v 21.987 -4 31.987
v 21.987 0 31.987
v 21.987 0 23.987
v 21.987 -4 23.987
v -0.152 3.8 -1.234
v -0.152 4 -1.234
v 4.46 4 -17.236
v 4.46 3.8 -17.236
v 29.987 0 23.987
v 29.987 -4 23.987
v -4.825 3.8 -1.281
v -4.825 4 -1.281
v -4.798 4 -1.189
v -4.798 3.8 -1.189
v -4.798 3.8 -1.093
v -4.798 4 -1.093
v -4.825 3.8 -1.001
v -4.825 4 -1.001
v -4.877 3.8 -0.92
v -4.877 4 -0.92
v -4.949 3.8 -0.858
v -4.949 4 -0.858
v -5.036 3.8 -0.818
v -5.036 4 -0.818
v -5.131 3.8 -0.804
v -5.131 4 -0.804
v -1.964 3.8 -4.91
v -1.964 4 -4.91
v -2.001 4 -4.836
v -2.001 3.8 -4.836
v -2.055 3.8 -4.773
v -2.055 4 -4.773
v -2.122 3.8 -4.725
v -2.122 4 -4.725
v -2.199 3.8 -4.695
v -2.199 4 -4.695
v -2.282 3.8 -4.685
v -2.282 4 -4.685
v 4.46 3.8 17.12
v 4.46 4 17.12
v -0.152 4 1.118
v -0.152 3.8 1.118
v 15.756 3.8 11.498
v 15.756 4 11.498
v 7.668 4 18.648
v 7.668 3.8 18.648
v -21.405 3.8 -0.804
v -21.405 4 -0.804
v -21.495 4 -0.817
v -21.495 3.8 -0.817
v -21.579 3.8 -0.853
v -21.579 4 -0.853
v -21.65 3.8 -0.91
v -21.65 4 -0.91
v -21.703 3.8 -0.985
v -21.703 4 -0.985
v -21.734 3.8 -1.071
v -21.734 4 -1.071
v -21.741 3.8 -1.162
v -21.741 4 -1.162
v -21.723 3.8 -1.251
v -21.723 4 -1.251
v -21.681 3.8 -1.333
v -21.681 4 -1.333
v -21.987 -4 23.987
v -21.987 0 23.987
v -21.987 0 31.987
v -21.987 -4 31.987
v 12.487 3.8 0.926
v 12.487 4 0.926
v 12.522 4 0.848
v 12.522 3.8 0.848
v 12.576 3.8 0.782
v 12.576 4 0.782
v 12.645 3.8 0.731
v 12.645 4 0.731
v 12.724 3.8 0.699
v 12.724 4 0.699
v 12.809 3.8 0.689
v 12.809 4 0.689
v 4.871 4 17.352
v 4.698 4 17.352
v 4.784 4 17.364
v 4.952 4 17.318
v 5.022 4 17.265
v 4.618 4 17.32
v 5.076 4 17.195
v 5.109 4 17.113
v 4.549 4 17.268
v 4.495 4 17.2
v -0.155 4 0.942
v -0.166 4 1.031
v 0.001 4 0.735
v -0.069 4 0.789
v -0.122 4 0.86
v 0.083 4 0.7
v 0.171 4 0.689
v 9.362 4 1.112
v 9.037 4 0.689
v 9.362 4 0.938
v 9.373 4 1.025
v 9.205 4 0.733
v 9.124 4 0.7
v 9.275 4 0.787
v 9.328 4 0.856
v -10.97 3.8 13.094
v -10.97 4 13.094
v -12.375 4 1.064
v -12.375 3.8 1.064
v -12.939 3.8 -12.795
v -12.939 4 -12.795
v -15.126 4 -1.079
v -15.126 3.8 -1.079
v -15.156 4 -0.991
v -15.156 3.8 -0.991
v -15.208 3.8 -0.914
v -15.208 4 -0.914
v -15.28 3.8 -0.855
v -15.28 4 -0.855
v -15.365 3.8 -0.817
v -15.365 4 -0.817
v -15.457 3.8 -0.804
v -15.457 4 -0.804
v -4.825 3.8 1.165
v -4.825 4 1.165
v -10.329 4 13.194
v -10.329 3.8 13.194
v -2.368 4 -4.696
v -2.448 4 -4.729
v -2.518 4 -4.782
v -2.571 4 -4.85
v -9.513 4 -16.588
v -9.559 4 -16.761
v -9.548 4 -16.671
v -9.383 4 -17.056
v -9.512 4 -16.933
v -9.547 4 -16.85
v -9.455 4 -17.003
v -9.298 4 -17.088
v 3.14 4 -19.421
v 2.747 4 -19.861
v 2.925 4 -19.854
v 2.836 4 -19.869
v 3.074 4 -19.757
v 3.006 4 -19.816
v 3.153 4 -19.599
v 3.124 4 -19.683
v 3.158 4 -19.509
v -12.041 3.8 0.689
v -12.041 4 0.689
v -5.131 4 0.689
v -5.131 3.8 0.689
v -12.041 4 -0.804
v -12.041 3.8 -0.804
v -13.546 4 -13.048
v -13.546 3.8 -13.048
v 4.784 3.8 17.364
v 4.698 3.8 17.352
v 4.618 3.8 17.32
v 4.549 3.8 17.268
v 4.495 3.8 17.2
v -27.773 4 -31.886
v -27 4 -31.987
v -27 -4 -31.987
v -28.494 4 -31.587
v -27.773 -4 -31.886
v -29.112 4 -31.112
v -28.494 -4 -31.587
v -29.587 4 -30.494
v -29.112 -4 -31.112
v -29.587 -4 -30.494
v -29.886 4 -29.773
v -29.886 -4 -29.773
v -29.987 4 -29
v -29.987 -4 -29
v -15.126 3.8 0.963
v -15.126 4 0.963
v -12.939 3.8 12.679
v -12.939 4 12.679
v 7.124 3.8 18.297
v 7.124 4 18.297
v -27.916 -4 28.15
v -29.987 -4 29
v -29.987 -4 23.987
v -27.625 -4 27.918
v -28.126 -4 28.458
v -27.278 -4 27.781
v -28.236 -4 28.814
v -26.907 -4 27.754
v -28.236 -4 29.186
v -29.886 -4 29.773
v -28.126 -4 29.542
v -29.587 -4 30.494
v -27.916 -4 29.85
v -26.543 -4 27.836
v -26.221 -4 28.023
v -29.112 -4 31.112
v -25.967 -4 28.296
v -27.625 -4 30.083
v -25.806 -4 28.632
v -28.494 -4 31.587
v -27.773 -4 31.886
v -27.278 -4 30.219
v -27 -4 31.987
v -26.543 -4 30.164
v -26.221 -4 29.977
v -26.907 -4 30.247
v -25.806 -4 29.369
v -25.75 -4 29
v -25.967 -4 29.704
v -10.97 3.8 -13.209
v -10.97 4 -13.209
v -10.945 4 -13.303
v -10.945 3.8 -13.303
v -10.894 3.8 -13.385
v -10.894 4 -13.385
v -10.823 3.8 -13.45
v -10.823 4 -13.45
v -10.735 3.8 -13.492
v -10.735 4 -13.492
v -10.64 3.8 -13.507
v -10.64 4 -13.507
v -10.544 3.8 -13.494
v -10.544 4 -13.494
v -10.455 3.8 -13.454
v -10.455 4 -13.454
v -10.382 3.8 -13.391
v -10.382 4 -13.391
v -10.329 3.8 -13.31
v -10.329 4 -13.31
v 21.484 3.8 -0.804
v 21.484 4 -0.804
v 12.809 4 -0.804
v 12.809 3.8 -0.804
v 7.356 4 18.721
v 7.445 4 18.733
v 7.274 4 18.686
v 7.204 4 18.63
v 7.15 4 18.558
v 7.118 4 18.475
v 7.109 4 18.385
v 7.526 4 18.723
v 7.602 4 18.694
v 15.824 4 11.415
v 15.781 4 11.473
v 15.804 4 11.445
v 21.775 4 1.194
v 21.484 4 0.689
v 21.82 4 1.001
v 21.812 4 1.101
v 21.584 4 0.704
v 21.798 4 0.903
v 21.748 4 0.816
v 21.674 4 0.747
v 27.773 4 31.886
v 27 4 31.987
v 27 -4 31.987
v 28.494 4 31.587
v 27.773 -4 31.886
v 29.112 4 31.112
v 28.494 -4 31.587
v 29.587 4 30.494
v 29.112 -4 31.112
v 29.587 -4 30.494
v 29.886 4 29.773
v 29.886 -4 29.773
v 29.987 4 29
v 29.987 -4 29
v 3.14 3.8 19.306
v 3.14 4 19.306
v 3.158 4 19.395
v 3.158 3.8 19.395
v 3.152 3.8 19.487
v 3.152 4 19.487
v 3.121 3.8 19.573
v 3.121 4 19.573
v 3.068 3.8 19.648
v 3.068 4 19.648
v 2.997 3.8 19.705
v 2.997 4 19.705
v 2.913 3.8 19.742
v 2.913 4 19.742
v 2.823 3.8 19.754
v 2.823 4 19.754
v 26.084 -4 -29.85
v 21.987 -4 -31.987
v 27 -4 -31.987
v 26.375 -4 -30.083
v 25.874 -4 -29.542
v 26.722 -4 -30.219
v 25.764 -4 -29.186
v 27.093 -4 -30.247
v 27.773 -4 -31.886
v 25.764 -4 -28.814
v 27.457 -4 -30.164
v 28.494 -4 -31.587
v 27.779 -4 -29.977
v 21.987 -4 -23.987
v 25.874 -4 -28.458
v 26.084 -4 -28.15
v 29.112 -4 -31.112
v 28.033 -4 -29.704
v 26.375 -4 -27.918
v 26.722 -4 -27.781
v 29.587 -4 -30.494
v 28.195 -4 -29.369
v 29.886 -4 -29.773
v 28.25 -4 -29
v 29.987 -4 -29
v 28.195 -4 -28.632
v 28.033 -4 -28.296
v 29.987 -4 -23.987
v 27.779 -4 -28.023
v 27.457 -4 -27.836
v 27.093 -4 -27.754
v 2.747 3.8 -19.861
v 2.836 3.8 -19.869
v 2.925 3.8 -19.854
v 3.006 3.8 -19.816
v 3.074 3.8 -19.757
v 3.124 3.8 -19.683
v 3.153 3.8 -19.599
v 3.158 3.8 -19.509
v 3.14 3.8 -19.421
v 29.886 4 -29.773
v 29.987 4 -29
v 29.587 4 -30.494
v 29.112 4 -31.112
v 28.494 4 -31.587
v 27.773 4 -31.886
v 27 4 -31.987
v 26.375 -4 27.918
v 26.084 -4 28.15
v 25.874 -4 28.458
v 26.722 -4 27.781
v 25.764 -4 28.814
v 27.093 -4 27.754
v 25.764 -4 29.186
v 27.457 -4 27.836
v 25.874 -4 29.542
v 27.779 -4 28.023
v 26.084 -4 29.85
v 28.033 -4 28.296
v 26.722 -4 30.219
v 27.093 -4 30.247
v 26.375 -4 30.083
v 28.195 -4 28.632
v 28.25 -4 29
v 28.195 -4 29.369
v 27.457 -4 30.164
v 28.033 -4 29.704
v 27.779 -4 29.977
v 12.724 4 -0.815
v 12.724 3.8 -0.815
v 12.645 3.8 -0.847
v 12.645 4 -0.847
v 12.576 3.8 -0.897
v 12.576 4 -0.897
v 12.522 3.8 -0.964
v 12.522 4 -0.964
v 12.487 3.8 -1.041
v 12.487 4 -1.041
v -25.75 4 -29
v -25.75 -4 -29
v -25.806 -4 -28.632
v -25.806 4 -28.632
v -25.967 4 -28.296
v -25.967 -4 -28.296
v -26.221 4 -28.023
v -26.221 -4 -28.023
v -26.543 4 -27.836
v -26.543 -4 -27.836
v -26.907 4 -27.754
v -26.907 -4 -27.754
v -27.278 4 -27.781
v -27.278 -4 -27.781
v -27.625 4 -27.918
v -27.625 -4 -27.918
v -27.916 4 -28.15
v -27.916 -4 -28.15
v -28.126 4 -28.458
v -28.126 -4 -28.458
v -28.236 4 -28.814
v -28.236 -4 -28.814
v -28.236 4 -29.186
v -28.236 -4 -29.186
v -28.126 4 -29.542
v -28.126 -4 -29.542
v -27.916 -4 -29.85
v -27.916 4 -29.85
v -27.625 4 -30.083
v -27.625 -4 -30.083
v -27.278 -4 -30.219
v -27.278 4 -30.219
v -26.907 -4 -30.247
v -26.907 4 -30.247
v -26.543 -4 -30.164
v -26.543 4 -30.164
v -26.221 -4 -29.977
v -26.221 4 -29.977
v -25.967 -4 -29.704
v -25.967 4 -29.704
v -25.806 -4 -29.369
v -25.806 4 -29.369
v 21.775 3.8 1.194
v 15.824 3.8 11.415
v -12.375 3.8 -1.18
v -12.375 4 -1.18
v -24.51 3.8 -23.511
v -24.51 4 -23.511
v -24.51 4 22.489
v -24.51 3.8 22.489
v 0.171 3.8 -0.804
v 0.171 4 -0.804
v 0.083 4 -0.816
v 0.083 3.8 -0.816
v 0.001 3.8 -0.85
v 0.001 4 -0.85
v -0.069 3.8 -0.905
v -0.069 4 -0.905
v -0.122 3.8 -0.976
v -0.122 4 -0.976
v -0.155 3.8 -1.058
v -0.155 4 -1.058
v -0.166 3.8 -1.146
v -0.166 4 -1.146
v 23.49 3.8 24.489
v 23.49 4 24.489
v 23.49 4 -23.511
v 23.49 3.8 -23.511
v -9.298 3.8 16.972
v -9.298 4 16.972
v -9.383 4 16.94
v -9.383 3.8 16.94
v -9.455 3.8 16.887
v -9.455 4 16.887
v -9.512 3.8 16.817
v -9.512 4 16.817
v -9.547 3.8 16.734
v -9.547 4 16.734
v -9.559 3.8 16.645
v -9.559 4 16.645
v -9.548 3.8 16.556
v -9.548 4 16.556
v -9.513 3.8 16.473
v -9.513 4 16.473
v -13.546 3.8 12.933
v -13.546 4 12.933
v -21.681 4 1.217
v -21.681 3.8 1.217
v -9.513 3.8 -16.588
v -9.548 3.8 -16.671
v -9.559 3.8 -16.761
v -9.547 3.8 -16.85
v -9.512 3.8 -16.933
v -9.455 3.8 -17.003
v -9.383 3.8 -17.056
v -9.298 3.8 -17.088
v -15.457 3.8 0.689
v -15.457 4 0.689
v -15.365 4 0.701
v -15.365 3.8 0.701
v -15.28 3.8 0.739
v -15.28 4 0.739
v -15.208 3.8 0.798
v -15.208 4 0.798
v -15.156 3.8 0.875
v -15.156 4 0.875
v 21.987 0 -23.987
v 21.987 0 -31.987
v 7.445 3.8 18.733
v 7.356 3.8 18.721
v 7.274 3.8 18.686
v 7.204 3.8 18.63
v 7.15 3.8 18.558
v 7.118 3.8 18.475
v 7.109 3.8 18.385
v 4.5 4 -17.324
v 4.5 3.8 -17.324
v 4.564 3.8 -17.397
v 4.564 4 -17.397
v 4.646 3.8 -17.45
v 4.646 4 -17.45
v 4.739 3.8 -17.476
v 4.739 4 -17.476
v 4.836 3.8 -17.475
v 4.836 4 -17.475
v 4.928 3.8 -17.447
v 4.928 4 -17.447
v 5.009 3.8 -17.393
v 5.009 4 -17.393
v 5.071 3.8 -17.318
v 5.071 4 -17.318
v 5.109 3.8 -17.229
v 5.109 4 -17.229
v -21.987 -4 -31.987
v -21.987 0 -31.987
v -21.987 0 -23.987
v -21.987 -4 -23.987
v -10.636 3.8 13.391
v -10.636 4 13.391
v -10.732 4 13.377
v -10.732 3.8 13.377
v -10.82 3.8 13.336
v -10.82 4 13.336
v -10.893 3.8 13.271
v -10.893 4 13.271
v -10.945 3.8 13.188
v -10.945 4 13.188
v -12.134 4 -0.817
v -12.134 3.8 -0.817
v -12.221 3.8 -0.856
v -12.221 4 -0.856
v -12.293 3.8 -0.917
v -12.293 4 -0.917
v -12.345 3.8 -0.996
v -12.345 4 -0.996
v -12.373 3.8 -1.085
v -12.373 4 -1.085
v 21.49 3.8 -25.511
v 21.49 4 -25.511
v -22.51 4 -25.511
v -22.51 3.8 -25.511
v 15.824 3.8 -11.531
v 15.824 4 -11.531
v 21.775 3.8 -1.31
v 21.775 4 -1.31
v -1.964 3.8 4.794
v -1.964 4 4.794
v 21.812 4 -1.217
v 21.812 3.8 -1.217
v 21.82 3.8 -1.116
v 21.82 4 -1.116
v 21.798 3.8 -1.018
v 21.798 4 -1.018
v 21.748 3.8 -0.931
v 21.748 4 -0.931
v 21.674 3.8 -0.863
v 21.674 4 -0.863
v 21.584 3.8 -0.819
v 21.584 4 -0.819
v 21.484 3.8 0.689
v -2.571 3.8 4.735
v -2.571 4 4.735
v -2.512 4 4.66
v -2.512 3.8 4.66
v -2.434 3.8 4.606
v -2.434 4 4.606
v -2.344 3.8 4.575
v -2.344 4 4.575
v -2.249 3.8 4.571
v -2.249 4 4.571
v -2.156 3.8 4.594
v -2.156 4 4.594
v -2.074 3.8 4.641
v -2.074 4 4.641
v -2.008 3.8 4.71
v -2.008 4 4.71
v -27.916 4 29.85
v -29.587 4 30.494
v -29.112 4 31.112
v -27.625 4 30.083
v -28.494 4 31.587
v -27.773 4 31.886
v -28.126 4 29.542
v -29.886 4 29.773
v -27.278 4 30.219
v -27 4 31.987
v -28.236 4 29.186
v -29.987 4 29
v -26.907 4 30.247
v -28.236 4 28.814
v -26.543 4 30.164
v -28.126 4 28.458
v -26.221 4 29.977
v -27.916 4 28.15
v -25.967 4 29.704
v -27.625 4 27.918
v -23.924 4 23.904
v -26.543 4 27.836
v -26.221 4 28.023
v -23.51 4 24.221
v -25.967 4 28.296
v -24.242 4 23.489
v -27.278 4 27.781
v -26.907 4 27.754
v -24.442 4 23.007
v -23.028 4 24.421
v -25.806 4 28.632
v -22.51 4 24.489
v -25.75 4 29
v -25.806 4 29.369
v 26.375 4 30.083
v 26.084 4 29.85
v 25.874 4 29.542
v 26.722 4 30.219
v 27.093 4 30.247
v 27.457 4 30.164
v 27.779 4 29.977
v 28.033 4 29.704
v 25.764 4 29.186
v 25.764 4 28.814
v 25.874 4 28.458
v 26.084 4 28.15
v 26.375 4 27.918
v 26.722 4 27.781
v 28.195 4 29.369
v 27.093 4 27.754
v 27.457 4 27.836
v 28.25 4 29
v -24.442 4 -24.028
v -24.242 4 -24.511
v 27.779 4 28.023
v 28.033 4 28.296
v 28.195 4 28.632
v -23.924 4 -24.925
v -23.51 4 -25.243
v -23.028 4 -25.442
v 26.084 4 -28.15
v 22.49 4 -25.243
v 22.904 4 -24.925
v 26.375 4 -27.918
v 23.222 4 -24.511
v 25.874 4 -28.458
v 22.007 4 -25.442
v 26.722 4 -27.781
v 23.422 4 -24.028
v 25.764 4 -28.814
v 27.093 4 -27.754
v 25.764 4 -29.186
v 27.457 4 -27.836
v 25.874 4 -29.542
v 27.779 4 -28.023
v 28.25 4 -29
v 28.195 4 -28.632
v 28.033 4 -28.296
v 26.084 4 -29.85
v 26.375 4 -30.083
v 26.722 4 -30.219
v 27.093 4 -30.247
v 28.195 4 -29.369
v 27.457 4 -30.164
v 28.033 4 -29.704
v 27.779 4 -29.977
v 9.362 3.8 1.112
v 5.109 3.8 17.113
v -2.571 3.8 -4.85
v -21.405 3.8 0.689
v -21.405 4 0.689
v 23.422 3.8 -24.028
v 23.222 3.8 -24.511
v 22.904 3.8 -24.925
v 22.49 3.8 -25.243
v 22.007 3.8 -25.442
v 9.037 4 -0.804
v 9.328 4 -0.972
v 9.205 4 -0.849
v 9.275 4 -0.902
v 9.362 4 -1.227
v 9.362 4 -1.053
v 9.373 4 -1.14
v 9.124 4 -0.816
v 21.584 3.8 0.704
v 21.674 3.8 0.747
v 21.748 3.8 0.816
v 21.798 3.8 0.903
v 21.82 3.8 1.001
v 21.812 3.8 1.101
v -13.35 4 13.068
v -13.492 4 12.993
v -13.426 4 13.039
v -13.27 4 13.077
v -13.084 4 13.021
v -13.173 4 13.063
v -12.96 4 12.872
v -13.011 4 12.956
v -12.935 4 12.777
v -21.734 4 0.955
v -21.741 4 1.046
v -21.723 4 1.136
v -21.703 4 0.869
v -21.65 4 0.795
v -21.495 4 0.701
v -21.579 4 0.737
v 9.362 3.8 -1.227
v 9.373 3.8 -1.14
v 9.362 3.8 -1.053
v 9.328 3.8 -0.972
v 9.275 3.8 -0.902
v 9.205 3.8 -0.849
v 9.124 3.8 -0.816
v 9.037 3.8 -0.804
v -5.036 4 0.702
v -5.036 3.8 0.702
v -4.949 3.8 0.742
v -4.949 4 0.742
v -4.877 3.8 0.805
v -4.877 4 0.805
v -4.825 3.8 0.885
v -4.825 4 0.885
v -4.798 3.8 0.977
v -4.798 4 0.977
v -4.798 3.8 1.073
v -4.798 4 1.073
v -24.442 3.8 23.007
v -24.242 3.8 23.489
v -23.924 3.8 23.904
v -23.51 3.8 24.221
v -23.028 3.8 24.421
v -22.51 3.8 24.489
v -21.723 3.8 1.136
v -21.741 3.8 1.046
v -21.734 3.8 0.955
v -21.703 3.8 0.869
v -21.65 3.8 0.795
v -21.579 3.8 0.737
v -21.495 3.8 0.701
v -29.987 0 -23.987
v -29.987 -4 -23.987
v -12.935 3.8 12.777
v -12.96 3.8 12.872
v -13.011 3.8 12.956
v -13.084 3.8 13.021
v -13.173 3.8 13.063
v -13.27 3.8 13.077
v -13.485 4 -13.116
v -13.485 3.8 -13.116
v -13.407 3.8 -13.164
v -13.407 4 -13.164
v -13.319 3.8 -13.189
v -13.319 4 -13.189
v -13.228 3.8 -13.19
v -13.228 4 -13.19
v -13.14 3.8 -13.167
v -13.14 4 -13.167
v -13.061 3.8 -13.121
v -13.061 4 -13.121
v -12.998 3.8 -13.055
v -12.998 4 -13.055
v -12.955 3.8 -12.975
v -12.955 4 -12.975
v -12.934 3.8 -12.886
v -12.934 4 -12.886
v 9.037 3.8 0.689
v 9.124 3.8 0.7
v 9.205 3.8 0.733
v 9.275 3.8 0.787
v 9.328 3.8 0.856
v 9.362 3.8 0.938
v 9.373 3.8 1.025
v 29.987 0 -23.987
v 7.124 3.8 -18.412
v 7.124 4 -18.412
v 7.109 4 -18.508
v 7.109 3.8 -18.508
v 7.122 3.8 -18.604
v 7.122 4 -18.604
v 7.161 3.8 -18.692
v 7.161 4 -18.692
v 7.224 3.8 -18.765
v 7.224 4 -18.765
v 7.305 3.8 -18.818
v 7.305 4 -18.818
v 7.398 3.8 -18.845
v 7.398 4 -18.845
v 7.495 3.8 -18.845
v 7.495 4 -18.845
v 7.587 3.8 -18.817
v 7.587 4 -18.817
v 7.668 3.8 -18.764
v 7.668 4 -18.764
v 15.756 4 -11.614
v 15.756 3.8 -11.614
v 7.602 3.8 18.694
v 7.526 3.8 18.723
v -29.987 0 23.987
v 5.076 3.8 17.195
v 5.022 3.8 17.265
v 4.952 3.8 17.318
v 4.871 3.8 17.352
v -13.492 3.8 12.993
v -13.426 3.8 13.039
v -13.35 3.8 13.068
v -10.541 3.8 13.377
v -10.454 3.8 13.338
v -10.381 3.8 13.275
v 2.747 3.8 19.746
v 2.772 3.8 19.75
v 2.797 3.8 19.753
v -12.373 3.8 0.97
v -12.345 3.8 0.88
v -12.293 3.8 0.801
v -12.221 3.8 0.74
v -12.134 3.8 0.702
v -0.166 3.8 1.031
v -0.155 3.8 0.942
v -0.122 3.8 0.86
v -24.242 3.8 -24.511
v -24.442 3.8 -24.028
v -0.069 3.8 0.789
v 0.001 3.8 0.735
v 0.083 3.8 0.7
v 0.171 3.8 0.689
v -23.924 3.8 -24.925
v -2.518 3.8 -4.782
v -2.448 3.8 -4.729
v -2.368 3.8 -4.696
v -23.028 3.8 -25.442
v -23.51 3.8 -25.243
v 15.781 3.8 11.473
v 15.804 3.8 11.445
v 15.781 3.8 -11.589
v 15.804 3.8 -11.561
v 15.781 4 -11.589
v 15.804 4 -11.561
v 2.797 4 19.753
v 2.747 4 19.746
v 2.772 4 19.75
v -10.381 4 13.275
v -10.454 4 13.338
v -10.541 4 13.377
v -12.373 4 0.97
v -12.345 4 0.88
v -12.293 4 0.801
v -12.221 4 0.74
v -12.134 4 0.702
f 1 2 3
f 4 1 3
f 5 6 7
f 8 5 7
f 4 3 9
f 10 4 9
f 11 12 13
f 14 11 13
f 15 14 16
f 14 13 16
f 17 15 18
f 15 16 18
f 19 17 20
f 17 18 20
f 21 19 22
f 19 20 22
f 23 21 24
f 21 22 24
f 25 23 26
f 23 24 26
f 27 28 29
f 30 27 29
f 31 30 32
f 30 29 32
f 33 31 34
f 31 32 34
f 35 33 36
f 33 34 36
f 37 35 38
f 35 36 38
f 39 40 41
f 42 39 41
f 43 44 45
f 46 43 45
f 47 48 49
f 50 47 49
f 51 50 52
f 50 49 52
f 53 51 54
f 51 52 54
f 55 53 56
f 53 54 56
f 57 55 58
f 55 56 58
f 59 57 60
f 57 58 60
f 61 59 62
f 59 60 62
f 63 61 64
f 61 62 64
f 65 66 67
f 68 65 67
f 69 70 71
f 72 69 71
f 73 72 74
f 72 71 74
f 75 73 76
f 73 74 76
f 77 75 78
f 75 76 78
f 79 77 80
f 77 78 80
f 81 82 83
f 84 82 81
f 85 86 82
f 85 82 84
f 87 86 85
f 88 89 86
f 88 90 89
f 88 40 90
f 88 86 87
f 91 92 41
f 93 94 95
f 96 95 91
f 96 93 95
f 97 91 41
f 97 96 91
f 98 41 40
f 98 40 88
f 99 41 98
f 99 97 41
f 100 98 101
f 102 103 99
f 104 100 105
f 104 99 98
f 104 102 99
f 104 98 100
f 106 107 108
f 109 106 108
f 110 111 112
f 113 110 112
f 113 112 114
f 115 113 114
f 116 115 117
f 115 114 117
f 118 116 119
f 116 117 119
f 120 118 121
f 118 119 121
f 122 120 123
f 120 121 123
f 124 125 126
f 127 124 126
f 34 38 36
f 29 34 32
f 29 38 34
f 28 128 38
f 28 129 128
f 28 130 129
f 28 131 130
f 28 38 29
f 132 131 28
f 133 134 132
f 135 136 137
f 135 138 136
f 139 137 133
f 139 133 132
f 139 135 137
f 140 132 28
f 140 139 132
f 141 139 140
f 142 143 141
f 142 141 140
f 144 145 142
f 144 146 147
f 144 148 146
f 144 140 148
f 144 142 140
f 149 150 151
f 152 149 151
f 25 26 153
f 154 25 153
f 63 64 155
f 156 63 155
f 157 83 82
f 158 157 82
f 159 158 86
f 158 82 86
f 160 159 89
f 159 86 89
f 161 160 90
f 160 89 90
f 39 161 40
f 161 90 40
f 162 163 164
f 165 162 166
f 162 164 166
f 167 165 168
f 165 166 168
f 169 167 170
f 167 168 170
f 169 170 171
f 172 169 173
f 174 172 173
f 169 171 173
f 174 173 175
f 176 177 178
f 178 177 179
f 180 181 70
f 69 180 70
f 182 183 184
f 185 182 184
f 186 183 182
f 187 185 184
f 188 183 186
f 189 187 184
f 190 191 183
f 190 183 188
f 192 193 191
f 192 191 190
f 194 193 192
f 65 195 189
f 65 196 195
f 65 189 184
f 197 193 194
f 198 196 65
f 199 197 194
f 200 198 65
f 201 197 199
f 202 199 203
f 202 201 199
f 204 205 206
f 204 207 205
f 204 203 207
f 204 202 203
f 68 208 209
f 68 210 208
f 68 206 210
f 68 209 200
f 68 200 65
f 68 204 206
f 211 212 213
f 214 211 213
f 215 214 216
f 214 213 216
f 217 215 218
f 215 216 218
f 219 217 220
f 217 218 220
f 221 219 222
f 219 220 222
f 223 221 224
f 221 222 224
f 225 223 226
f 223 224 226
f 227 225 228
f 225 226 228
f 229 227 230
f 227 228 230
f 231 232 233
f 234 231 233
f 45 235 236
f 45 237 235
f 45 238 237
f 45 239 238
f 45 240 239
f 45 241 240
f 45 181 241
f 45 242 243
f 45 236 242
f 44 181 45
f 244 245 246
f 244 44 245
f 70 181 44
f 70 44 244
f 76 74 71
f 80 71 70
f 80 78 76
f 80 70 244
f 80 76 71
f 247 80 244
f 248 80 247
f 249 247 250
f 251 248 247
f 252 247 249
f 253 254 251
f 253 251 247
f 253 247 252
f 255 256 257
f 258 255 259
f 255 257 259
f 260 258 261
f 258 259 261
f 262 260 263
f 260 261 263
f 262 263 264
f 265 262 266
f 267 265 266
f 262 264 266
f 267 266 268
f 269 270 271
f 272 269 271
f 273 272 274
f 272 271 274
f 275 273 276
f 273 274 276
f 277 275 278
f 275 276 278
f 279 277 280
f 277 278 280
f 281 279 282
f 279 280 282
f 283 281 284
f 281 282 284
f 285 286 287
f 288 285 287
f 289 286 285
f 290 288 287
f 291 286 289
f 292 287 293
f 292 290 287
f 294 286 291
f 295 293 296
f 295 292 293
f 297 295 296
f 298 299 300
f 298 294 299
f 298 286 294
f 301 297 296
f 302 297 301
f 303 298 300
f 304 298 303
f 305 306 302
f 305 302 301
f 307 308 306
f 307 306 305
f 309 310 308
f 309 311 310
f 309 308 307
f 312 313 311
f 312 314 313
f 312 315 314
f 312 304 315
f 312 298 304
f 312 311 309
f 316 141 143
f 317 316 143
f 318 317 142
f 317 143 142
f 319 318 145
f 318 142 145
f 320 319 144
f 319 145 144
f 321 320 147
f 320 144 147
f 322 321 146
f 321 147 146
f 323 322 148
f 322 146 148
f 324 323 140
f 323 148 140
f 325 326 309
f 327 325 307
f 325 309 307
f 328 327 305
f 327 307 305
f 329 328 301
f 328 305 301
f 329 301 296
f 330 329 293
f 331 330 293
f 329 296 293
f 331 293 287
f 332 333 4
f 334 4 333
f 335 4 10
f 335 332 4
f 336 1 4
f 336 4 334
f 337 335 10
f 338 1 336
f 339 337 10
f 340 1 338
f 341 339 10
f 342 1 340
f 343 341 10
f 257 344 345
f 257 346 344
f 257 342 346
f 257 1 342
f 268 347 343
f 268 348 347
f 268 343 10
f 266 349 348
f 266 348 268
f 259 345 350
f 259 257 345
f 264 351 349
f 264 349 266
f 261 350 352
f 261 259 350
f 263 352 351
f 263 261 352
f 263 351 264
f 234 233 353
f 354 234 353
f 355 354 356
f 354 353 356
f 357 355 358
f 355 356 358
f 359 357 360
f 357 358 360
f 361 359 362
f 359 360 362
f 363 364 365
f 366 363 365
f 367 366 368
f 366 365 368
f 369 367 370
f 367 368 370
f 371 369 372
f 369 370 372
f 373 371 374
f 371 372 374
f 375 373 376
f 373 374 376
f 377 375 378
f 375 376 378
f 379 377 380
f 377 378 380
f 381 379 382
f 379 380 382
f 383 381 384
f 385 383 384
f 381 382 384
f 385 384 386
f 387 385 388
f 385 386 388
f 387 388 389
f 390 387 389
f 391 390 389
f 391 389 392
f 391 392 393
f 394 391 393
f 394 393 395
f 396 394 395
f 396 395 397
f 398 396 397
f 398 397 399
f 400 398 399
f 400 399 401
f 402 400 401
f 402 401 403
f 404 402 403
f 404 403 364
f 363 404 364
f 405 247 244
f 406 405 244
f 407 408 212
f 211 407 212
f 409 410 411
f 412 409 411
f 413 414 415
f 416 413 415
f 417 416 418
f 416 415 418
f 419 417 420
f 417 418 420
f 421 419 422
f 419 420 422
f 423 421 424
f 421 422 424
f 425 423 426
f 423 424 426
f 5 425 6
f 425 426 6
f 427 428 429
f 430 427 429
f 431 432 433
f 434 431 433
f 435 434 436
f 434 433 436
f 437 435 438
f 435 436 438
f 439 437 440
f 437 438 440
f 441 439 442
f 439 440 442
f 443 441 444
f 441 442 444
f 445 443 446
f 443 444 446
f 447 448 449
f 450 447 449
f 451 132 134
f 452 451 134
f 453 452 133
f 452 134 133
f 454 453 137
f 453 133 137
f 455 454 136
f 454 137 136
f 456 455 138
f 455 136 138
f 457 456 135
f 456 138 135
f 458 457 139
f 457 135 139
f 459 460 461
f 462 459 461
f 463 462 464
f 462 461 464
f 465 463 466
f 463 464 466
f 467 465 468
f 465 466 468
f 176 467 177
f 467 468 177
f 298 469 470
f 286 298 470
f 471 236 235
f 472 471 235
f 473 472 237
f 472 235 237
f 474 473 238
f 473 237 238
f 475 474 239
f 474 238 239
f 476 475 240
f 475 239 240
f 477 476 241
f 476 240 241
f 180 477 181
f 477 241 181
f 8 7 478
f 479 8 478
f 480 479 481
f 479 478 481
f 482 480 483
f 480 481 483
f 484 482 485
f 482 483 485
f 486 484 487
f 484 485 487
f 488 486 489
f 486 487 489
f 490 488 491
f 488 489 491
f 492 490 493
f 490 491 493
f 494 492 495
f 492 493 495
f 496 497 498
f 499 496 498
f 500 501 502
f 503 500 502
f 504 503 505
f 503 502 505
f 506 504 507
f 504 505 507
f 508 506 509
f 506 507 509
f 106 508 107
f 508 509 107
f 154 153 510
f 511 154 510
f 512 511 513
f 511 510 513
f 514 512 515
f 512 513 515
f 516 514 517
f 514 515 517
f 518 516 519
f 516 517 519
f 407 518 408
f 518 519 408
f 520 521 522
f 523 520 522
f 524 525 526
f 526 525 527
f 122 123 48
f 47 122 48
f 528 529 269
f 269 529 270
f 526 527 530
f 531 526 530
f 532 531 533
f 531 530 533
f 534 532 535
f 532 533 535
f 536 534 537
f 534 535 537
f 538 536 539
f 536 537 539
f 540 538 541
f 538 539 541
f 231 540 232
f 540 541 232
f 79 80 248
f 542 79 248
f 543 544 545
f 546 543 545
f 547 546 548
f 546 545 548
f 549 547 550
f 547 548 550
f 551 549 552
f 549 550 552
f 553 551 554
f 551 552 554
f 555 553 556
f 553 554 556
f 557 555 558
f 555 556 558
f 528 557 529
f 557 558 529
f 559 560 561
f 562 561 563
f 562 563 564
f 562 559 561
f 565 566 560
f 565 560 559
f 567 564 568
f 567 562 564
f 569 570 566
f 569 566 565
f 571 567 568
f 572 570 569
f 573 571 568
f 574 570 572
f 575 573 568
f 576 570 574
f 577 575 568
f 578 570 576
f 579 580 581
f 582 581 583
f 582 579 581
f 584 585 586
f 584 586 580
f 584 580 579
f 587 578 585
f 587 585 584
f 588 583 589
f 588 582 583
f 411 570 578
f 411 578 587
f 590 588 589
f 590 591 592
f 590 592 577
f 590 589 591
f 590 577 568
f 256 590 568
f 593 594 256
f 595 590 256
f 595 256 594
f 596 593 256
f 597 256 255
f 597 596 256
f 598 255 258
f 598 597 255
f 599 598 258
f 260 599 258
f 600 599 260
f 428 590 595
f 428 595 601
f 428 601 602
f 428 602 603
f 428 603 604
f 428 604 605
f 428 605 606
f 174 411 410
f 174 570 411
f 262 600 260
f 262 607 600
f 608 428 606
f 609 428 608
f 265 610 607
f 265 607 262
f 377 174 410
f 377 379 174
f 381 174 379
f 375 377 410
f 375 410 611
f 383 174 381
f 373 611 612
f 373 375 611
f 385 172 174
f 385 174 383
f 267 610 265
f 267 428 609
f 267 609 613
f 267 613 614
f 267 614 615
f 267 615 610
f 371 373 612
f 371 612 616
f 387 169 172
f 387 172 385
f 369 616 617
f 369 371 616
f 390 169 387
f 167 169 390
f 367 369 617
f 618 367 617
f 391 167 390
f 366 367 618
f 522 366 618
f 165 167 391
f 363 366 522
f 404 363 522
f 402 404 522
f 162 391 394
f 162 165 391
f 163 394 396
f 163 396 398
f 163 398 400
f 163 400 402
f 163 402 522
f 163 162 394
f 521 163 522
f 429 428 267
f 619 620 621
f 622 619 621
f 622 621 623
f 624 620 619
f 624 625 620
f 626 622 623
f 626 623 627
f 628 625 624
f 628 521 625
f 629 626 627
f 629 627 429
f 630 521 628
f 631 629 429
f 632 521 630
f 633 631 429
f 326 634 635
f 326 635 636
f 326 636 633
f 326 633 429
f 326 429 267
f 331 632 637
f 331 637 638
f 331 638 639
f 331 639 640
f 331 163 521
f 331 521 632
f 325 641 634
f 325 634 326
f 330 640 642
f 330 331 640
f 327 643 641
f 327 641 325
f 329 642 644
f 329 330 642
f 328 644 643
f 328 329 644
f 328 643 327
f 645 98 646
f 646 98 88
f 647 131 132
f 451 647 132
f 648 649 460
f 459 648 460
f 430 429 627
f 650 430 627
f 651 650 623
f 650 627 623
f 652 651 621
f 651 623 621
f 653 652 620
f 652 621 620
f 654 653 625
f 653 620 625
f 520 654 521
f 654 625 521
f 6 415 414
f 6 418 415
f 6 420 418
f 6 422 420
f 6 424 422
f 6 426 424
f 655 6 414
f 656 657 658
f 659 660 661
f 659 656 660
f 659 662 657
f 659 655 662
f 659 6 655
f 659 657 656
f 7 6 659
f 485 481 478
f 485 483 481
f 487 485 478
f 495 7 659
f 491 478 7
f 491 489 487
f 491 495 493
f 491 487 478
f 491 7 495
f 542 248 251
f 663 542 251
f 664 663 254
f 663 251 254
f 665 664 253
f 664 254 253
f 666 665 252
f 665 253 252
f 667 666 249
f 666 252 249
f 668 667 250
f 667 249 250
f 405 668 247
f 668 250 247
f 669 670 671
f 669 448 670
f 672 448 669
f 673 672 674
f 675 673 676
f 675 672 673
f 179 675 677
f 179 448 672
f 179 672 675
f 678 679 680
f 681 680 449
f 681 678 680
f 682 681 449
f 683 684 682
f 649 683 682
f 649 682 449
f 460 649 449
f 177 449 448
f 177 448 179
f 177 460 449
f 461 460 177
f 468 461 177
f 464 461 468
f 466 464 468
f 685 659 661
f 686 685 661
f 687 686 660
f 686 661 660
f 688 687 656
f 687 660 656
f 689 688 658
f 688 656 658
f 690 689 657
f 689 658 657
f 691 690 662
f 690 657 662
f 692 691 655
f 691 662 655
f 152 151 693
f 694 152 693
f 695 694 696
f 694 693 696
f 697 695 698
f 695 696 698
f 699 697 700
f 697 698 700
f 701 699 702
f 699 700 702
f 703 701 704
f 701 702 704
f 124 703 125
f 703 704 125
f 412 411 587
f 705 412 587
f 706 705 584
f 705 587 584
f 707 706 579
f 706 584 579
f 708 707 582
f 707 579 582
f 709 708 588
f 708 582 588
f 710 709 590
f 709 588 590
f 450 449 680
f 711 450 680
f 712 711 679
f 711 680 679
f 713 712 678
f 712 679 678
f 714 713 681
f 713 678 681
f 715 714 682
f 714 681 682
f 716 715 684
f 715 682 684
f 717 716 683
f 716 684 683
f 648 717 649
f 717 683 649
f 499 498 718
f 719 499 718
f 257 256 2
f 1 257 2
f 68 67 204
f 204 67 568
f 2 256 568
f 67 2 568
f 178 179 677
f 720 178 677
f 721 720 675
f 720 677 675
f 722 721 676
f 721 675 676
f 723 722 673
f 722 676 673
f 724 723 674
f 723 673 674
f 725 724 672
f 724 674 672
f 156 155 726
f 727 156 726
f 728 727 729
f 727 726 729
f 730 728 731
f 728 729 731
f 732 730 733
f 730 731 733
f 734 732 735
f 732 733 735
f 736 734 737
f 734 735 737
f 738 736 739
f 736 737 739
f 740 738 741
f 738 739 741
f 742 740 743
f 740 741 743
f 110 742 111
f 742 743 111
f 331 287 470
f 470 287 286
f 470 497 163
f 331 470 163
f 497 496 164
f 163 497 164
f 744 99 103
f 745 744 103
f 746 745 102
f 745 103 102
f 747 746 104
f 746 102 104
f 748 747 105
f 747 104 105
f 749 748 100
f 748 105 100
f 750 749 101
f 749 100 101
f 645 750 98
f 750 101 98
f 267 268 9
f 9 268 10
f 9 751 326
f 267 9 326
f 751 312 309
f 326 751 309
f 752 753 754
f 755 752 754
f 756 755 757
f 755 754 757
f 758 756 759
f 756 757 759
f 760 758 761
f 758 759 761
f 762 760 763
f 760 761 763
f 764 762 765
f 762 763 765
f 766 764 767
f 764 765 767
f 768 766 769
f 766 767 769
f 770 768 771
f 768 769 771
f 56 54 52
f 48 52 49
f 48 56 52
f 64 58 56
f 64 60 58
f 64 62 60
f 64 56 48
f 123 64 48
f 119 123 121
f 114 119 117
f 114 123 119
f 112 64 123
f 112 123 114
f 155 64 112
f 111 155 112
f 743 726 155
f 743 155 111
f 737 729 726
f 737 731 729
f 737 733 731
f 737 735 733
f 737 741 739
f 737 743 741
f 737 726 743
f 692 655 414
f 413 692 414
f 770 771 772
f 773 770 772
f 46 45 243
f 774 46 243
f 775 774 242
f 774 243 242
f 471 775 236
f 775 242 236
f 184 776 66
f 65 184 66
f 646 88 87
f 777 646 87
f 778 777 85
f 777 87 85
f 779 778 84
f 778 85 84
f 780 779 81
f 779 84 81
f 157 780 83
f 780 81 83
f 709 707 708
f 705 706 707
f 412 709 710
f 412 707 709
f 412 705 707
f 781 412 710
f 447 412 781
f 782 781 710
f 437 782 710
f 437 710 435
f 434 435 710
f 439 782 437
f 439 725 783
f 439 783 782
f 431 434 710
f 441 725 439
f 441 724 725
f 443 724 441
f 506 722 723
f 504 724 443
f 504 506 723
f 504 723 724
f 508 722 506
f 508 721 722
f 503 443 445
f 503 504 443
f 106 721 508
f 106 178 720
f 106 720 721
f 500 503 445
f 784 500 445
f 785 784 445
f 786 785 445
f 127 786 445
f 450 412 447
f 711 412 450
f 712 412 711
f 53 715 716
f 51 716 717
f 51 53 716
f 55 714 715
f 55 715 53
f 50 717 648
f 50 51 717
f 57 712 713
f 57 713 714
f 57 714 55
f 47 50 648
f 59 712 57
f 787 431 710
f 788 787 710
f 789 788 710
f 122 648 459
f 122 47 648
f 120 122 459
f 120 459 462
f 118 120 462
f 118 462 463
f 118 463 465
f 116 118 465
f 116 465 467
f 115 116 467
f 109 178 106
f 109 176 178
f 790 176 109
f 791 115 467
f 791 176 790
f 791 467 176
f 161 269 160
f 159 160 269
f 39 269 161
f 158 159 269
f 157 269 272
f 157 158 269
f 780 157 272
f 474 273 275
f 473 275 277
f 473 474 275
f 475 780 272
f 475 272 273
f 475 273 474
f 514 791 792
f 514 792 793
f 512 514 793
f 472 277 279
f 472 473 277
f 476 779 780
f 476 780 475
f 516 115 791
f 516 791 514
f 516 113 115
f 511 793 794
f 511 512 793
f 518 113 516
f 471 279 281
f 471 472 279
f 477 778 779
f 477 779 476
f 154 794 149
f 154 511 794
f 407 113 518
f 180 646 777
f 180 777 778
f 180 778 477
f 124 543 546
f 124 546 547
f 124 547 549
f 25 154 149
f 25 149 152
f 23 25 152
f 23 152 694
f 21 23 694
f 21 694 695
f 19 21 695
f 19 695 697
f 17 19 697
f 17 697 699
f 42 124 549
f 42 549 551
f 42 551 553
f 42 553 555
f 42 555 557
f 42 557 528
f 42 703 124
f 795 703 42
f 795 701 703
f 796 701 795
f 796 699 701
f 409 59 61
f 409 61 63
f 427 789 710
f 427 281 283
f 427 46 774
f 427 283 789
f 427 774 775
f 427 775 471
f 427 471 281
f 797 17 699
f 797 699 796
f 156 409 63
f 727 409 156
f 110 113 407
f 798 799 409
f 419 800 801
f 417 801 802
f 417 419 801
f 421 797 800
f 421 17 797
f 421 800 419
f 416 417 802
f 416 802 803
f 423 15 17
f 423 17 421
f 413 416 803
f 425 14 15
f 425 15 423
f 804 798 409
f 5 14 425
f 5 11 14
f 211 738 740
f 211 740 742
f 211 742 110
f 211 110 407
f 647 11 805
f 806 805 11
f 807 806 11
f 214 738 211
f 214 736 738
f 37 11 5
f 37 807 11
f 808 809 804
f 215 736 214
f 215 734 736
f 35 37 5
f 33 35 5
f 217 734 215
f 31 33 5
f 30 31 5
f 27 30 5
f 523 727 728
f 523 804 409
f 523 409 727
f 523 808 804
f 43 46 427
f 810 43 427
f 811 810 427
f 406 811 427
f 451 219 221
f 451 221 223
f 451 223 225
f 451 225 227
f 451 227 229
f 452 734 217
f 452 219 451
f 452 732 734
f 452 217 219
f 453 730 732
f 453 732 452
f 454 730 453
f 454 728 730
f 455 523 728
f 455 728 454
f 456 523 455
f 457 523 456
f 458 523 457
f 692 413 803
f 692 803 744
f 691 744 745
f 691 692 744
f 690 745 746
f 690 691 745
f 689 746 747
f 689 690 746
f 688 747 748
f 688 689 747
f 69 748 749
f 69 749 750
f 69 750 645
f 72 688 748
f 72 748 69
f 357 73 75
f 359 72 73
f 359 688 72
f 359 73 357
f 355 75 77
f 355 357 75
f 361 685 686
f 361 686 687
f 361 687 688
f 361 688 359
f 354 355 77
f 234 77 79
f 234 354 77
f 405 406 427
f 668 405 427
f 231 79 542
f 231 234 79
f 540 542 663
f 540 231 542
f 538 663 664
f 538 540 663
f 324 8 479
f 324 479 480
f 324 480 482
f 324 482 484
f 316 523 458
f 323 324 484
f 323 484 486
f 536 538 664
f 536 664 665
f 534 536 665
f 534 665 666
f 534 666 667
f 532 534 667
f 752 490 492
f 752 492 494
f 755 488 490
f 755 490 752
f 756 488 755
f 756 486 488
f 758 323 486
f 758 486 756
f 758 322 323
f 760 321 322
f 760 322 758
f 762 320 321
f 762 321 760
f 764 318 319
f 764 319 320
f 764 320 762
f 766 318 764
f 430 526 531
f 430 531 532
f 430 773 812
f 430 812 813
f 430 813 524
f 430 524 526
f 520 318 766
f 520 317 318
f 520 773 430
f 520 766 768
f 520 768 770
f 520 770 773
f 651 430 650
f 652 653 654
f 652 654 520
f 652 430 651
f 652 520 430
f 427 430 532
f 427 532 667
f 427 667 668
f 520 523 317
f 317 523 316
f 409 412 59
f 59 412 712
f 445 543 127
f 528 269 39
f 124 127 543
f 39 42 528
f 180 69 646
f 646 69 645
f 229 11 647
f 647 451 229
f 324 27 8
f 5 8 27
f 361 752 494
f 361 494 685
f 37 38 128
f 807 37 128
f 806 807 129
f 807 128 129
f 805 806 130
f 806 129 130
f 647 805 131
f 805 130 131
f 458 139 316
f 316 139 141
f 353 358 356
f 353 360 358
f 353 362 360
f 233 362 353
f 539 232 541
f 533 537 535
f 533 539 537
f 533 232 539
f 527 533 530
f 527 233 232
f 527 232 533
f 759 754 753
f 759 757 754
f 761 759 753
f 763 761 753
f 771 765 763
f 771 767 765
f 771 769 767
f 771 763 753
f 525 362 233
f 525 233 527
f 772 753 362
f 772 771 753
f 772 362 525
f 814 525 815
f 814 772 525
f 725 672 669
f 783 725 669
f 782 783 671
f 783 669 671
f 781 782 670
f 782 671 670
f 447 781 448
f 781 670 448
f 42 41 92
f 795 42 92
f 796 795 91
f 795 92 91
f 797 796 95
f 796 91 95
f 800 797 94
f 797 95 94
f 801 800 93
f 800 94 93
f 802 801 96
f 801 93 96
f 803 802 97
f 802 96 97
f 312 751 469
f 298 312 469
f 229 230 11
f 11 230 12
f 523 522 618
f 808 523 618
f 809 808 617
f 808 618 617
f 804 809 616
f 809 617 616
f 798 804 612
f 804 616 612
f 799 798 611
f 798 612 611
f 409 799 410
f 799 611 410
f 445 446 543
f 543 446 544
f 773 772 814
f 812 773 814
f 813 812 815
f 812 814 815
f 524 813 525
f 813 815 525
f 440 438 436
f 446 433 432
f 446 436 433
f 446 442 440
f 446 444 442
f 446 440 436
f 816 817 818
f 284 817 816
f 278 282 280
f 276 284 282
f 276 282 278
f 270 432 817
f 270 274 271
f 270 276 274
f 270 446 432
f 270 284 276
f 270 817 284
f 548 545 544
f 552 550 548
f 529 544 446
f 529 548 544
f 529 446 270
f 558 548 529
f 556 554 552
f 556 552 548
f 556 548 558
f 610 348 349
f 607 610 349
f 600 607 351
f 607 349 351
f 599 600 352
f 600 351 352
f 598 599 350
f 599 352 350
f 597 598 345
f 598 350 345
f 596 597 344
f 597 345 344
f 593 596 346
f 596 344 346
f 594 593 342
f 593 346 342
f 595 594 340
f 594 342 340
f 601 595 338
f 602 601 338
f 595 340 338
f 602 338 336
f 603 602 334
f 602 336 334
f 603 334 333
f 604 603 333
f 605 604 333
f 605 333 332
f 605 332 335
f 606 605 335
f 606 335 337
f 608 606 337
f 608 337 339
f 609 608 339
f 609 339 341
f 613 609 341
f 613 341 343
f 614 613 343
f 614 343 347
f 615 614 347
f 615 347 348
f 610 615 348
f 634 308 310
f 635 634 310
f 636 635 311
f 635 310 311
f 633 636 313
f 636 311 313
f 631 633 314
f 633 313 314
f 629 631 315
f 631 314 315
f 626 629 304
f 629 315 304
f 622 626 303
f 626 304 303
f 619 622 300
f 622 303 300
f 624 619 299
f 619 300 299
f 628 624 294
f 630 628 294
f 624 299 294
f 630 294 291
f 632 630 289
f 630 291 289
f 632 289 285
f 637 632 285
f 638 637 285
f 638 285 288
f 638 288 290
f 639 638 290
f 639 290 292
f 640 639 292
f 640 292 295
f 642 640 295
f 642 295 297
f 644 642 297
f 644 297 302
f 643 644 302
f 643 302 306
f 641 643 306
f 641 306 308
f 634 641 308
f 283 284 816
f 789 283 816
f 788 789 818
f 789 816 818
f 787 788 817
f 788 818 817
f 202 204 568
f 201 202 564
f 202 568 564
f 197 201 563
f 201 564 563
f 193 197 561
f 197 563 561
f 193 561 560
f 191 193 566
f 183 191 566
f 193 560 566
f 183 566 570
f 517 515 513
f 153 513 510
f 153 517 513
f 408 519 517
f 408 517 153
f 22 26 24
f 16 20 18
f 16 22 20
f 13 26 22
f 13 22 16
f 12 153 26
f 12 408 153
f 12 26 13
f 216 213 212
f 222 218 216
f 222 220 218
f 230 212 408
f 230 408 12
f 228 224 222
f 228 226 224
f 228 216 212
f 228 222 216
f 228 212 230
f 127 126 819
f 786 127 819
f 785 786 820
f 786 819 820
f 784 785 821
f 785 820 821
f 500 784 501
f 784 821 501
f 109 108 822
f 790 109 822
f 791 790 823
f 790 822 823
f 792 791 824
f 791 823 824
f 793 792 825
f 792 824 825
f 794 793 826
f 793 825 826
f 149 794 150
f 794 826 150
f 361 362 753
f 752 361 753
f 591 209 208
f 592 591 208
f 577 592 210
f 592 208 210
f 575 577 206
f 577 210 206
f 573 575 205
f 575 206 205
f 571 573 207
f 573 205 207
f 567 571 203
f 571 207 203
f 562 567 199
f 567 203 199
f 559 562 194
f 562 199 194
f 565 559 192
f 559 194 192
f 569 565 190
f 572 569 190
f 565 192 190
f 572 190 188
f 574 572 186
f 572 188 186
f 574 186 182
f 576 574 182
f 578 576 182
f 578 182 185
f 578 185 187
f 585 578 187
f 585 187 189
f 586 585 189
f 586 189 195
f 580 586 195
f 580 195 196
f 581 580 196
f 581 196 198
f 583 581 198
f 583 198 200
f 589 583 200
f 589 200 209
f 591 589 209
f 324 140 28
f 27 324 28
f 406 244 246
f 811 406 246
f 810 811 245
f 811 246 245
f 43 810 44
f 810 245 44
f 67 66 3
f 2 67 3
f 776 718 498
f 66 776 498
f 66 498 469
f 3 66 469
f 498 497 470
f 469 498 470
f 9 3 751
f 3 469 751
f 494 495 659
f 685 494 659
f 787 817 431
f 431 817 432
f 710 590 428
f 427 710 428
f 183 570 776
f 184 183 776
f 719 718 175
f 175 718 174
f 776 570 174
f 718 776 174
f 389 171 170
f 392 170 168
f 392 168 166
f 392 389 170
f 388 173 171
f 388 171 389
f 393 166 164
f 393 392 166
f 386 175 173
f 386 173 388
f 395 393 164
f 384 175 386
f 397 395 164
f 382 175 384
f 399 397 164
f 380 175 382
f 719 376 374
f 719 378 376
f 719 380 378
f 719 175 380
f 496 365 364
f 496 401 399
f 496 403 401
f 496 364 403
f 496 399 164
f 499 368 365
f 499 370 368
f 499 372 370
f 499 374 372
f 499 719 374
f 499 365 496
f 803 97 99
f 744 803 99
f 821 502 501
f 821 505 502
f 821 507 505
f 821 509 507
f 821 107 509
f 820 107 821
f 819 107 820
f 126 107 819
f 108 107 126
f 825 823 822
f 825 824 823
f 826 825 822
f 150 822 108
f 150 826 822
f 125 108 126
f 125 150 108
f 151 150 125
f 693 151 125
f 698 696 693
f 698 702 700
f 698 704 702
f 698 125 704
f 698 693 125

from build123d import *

# Parameters (mm, degrees)
EXTRUDE_1_DEPTH     = 4
EXTRUDE_2_DEPTH     = 4
SKETCH_3_R          = 1.25
CUT_EXTRUDE_1_DEPTH = 15
CUT_EXTRUDE_2_DEPTH = 0.2


with BuildPart() as part:
    # 草图1 → 凸台-拉伸1 (new body)
    with BuildSketch(Plane(origin=(0, 0, 0), x_dir=(1, 0, 0), z_dir=(0, 1, 0))):
        with BuildLine():
            Line((-27.00005461, -31.987363475), (27.00005461, -31.987363475))
            ThreePointArc((27.00005461, -31.987363475), (29.112398272, -31.112402082), (29.987359665, -29.00005842))
            Line((29.987359665, -29.00005842), (29.987359665, 29.00005842))
            ThreePointArc((29.987359665, 29.00005842), (29.112398272, 31.112402082), (27.00005461, 31.987363475))
            Line((27.00005461, 31.987363475), (-27.00005461, 31.987363475))
            ThreePointArc((-27.00005461, 31.987363475), (-29.112398272, 31.112402082), (-29.987359665, 29.00005842))
            Line((-29.987359665, 29.00005842), (-29.987359665, -29.00005842))
            ThreePointArc((-29.987359665, -29.00005842), (-29.112398272, -31.112402082), (-27.00005461, -31.987363475))
        make_face()
    extrude(amount=EXTRUDE_1_DEPTH)

    # 草图2 → 凸台-拉伸2 (add)
    with BuildSketch(Plane.XZ):
        with BuildLine():
            Line((-21.987359665, 23.987363475), (-21.987359665, 31.987363475))
            Line((-21.987359665, 31.987363475), (-27.00005461, 31.987363475))
            ThreePointArc((-27.00005461, 31.987363475), (-29.112398272, 31.112402082), (-29.987359665, 29.00005842))
            Line((-29.987359665, 29.00005842), (-29.987359665, 23.987363475))
            Line((-29.987359665, 23.987363475), (-21.987359665, 23.987363475))
        make_face()
        with BuildLine():
            Line((21.987359665, -23.987363475), (21.987359665, -31.987363475))
            Line((21.987359665, -31.987363475), (27.00005461, -31.987363475))
            ThreePointArc((27.00005461, -31.987363475), (29.112398272, -31.112402082), (29.987359665, -29.00005842))
            Line((29.987359665, -29.00005842), (29.987359665, -23.987363475))
            Line((29.987359665, -23.987363475), (21.987359665, -23.987363475))
        make_face()
        with BuildLine():
            Line((21.987359665, 23.987363475), (29.987359665, 23.987363475))
            Line((29.987359665, 23.987363475), (29.987359665, 29.00005842))
            ThreePointArc((29.987359665, 29.00005842), (29.112398272, 31.112402082), (27.00005461, 31.987363475))
            Line((27.00005461, 31.987363475), (21.987359665, 31.987363475))
            Line((21.987359665, 31.987363475), (21.987359665, 23.987363475))
        make_face()
        with BuildLine():
            Line((-29.987359665, -23.987363475), (-29.987359665, -29.00005842))
            ThreePointArc((-29.987359665, -29.00005842), (-29.112398272, -31.112402082), (-27.00005461, -31.987363475))
            Line((-27.00005461, -31.987363475), (-21.987359665, -31.987363475))
            Line((-21.987359665, -31.987363475), (-21.987359665, -23.987363475))
            Line((-21.987359665, -23.987363475), (-29.987359665, -23.987363475))
        make_face()
    extrude(amount=EXTRUDE_2_DEPTH)

    # 草图3 → 切除-拉伸1 (cut)
    with BuildSketch(Plane.XZ.offset(4)):
        with Locations((-27.00005461, 29.00005842)):
            Circle(SKETCH_3_R)
        with Locations((27.00005461, 29.00005842)):
            Circle(SKETCH_3_R)
        with Locations((27.00005461, -29.00005842)):
            Circle(SKETCH_3_R)
        with Locations((-27.00005461, -29.00005842)):
            Circle(SKETCH_3_R)
    extrude(amount=-CUT_EXTRUDE_1_DEPTH, mode=Mode.SUBTRACT)

    # 草图5 → 切除-拉伸2 (cut)
    with BuildSketch(Plane(origin=(0, 4, 0), x_dir=(1, 0, 0), z_dir=(0, 1, 0))):
        with BuildLine():
            ThreePointArc((-24.510212589, -22.489370571), (-23.924426151, -23.903584133), (-22.510212589, -24.489370571))
            Line((-22.510212589, -24.489370571), (23.489787411, -24.489370571))
            Line((23.489787411, -24.489370571), (23.489787411, 23.510629429))
            ThreePointArc((23.489787411, 23.510629429), (22.904000974, 24.924842991), (21.489787411, 25.510629429))
            Line((21.489787411, 25.510629429), (-22.510212589, 25.510629429))
            ThreePointArc((-22.510212589, 25.510629429), (-23.924426151, 24.924842991), (-24.510212589, 23.510629429))
            Line((-24.510212589, 23.510629429), (-24.510212589, -22.489370571))
        make_face()
        with BuildLine():
            Line((-21.404655137, -0.688500192), (-15.457204068, -0.688500192))
            ThreePointArc((-15.457204068, -0.688500192), (-15.242140256, -0.766165613), (-15.126321966, -0.963321604))
            Line((-15.126321966, -0.963321604), (-12.93890785, -12.678969469))
            ThreePointArc((-12.93890785, -12.678969469), (-13.010855373, -12.95581187), (-13.269789952, -13.077348057))
            ThreePointArc((-13.269789952, -13.077348057), (-13.425801703, -13.039009509), (-13.546274154, -12.932727342))
            Line((-13.546274154, -12.932727342), (-21.681139339, -1.217079478))
            ThreePointArc((-21.681139339, -1.217079478), (-21.702916589, -0.869088442), (-21.404655137, -0.688500192))
        make_face(mode=Mode.SUBTRACT)
        with BuildLine():
            Line((-9.512596077, -16.472848359), (-2.571281975, -4.734690874))
            ThreePointArc((-2.571281975, -4.734690874), (-2.248646777, -4.571034999), (-1.964018884, -4.794336767))
            Line((-1.964018884, -4.794336767), (3.140150939, -19.305798562))
            ThreePointArc((3.140150939, -19.305798562), (3.097295639, -19.61204324), (2.822620241, -19.754084802))
            ThreePointArc((2.822620241, -19.754084802), (2.784616416, -19.75193251), (2.7470986, -19.745503158))
            Line((2.7470986, -19.745503158), (-9.298385325, -16.972198847))
            ThreePointArc((-9.298385325, -16.972198847), (-9.53220226, -16.77688017), (-9.512596077, -16.472848359))
        make_face(mode=Mode.SUBTRACT)
        with BuildLine():
            Line((-12.041068111, -0.688500192), (-5.131124443, -0.688500192))
            ThreePointArc((-5.131124443, -0.688500192), (-4.847891187, -0.843225283), (-4.825045876, -1.165155435))
            Line((-4.825045876, -1.165155435), (-10.329425017, -13.194497943))
            ThreePointArc((-10.329425017, -13.194497943), (-10.453628675, -13.337675957), (-10.635503584, -13.391042701))
            ThreePointArc((-10.635503584, -13.391042701), (-10.859278656, -13.305887083), (-10.969829102, -13.093506855))
            Line((-10.969829102, -13.093506855), (-12.375393629, -1.064164346))
            ThreePointArc((-12.375393629, -1.064164346), (-12.292512493, -0.80132512), (-12.041068111, -0.688500192))
        make_face(mode=Mode.SUBTRACT)
        with BuildLine():
            Line((9.36207412, -1.111559506), (5.109122277, -17.113456876))
            ThreePointArc((5.109122277, -17.113456876), (4.988995356, -17.293832498), (4.783815734, -17.363597563))
            ThreePointArc((4.783815734, -17.363597563), (4.581434131, -17.295960844), (4.460386024, -17.120232659))
            Line((4.460386024, -17.120232659), (-0.152481619, -1.118335289))
            ThreePointArc((-0.152481619, -1.118335289), (-0.098015191, -0.822718589), (0.17094809, -0.688500192))
            Line((0.17094809, -0.688500192), (9.036767577, -0.688500192))
            ThreePointArc((9.036767577, -0.688500192), (9.303602512, -0.81992057), (9.36207412, -1.111559506))
        make_face(mode=Mode.SUBTRACT)
        with BuildLine():
            Line((12.808517611, -0.688500192), (21.484169915, -0.688500192))
            ThreePointArc((21.484169915, -0.688500192), (21.775984057, -0.857338258), (21.775051109, -1.194474604))
            Line((21.775051109, -1.194474604), (15.823663685, -11.415302329))
            ThreePointArc((15.823663685, -11.415302329), (15.793013116, -11.45942167), (15.755733936, -11.498102884))
            Line((15.755733936, -11.498102884), (7.668279808, -18.648335147))
            ThreePointArc((7.668279808, -18.648335147), (7.564528755, -18.710947136), (7.445328364, -18.732760181))
            ThreePointArc((7.445328364, -18.732760181), (7.174474873, -18.596004987), (7.123708261, -18.296862298))
            Line((7.123708261, -18.296862298), (12.486897508, -0.92580231))
            ThreePointArc((12.486897508, -0.92580231), (12.608672805, -0.754246701), (12.808517611, -0.688500192))
        make_face(mode=Mode.SUBTRACT)
        with BuildLine():
            Line((-21.681139339, 1.332693738), (-13.546274154, 13.048341603))
            ThreePointArc((-13.546274154, 13.048341603), (-13.14002845, 13.166944855), (-12.93890785, 12.794583729))
            Line((-12.93890785, 12.794583729), (-15.126321966, 1.078935865))
            ThreePointArc((-15.126321966, 1.078935865), (-15.242140256, 0.881779873), (-15.457204068, 0.804114453))
            Line((-15.457204068, 0.804114453), (-21.404655137, 0.804114453))
            ThreePointArc((-21.404655137, 0.804114453), (-21.702916589, 0.984702702), (-21.681139339, 1.332693738))
        make_face(mode=Mode.SUBTRACT)
        with BuildLine():
            Line((-12.375393629, 1.179778607), (-10.969829102, 13.209121115))
            ThreePointArc((-10.969829102, 13.209121115), (-10.68793709, 13.502547995), (-10.329425017, 13.310112203))
            Line((-10.329425017, 13.310112203), (-4.825045876, 1.280769695))
            ThreePointArc((-4.825045876, 1.280769695), (-4.847891187, 0.958839543), (-5.131124443, 0.804114453))
            Line((-5.131124443, 0.804114453), (-12.041068111, 0.804114453))
            ThreePointArc((-12.041068111, 0.804114453), (-12.292512493, 0.916939381), (-12.375393629, 1.179778607))
        make_face(mode=Mode.SUBTRACT)
        with BuildLine():
            Line((-2.571281975, 4.850305134), (-9.512596077, 16.588462619))
            ThreePointArc((-9.512596077, 16.588462619), (-9.53220226, 16.89249443), (-9.298385325, 17.087813107))
            Line((-9.298385325, 17.087813107), (2.7470986, 19.861117418))
            ThreePointArc((2.7470986, 19.861117418), (3.073572684, 19.75742568), (3.140150939, 19.421412823))
            Line((3.140150939, 19.421412823), (-1.964018884, 4.909951027))
            ThreePointArc((-1.964018884, 4.909951027), (-2.086991143, 4.746961869), (-2.281549581, 4.685037267))
            ThreePointArc((-2.281549581, 4.685037267), (-2.448326624, 4.729259125), (-2.571281975, 4.850305134))
        make_face(mode=Mode.SUBTRACT)
        with BuildLine():
            Line((9.036767577, 0.804114453), (0.17094809, 0.804114453))
            ThreePointArc((0.17094809, 0.804114453), (-0.098015191, 0.93833285), (-0.152481619, 1.233949549))
            Line((-0.152481619, 1.233949549), (4.460386024, 17.235846919))
            ThreePointArc((4.460386024, 17.235846919), (4.78733119, 17.479193465), (5.109122277, 17.229071137))
            Line((5.109122277, 17.229071137), (9.36207412, 1.227173766))
            ThreePointArc((9.36207412, 1.227173766), (9.303602512, 0.93553483), (9.036767577, 0.804114453))
        make_face(mode=Mode.SUBTRACT)
        with BuildLine():
            Line((21.484169915, 0.804114453), (12.808517611, 0.804114453))
            ThreePointArc((12.808517611, 0.804114453), (12.608672805, 0.869860962), (12.486897508, 1.04141657))
            Line((12.486897508, 1.04141657), (7.123708261, 18.412476559))
            ThreePointArc((7.123708261, 18.412476559), (7.262798457, 18.794586027), (7.668279808, 18.763949407))
            Line((7.668279808, 18.763949407), (15.755733936, 11.613717144))
            ThreePointArc((15.755733936, 11.613717144), (15.793013116, 11.57503593), (15.823663685, 11.53091659))
            Line((15.823663685, 11.53091659), (21.775051109, 1.310088864))
            ThreePointArc((21.775051109, 1.310088864), (21.775984057, 0.972952518), (21.484169915, 0.804114453))
        make_face(mode=Mode.SUBTRACT)
    extrude(amount=-CUT_EXTRUDE_2_DEPTH, mode=Mode.SUBTRACT)


solid = part.part
